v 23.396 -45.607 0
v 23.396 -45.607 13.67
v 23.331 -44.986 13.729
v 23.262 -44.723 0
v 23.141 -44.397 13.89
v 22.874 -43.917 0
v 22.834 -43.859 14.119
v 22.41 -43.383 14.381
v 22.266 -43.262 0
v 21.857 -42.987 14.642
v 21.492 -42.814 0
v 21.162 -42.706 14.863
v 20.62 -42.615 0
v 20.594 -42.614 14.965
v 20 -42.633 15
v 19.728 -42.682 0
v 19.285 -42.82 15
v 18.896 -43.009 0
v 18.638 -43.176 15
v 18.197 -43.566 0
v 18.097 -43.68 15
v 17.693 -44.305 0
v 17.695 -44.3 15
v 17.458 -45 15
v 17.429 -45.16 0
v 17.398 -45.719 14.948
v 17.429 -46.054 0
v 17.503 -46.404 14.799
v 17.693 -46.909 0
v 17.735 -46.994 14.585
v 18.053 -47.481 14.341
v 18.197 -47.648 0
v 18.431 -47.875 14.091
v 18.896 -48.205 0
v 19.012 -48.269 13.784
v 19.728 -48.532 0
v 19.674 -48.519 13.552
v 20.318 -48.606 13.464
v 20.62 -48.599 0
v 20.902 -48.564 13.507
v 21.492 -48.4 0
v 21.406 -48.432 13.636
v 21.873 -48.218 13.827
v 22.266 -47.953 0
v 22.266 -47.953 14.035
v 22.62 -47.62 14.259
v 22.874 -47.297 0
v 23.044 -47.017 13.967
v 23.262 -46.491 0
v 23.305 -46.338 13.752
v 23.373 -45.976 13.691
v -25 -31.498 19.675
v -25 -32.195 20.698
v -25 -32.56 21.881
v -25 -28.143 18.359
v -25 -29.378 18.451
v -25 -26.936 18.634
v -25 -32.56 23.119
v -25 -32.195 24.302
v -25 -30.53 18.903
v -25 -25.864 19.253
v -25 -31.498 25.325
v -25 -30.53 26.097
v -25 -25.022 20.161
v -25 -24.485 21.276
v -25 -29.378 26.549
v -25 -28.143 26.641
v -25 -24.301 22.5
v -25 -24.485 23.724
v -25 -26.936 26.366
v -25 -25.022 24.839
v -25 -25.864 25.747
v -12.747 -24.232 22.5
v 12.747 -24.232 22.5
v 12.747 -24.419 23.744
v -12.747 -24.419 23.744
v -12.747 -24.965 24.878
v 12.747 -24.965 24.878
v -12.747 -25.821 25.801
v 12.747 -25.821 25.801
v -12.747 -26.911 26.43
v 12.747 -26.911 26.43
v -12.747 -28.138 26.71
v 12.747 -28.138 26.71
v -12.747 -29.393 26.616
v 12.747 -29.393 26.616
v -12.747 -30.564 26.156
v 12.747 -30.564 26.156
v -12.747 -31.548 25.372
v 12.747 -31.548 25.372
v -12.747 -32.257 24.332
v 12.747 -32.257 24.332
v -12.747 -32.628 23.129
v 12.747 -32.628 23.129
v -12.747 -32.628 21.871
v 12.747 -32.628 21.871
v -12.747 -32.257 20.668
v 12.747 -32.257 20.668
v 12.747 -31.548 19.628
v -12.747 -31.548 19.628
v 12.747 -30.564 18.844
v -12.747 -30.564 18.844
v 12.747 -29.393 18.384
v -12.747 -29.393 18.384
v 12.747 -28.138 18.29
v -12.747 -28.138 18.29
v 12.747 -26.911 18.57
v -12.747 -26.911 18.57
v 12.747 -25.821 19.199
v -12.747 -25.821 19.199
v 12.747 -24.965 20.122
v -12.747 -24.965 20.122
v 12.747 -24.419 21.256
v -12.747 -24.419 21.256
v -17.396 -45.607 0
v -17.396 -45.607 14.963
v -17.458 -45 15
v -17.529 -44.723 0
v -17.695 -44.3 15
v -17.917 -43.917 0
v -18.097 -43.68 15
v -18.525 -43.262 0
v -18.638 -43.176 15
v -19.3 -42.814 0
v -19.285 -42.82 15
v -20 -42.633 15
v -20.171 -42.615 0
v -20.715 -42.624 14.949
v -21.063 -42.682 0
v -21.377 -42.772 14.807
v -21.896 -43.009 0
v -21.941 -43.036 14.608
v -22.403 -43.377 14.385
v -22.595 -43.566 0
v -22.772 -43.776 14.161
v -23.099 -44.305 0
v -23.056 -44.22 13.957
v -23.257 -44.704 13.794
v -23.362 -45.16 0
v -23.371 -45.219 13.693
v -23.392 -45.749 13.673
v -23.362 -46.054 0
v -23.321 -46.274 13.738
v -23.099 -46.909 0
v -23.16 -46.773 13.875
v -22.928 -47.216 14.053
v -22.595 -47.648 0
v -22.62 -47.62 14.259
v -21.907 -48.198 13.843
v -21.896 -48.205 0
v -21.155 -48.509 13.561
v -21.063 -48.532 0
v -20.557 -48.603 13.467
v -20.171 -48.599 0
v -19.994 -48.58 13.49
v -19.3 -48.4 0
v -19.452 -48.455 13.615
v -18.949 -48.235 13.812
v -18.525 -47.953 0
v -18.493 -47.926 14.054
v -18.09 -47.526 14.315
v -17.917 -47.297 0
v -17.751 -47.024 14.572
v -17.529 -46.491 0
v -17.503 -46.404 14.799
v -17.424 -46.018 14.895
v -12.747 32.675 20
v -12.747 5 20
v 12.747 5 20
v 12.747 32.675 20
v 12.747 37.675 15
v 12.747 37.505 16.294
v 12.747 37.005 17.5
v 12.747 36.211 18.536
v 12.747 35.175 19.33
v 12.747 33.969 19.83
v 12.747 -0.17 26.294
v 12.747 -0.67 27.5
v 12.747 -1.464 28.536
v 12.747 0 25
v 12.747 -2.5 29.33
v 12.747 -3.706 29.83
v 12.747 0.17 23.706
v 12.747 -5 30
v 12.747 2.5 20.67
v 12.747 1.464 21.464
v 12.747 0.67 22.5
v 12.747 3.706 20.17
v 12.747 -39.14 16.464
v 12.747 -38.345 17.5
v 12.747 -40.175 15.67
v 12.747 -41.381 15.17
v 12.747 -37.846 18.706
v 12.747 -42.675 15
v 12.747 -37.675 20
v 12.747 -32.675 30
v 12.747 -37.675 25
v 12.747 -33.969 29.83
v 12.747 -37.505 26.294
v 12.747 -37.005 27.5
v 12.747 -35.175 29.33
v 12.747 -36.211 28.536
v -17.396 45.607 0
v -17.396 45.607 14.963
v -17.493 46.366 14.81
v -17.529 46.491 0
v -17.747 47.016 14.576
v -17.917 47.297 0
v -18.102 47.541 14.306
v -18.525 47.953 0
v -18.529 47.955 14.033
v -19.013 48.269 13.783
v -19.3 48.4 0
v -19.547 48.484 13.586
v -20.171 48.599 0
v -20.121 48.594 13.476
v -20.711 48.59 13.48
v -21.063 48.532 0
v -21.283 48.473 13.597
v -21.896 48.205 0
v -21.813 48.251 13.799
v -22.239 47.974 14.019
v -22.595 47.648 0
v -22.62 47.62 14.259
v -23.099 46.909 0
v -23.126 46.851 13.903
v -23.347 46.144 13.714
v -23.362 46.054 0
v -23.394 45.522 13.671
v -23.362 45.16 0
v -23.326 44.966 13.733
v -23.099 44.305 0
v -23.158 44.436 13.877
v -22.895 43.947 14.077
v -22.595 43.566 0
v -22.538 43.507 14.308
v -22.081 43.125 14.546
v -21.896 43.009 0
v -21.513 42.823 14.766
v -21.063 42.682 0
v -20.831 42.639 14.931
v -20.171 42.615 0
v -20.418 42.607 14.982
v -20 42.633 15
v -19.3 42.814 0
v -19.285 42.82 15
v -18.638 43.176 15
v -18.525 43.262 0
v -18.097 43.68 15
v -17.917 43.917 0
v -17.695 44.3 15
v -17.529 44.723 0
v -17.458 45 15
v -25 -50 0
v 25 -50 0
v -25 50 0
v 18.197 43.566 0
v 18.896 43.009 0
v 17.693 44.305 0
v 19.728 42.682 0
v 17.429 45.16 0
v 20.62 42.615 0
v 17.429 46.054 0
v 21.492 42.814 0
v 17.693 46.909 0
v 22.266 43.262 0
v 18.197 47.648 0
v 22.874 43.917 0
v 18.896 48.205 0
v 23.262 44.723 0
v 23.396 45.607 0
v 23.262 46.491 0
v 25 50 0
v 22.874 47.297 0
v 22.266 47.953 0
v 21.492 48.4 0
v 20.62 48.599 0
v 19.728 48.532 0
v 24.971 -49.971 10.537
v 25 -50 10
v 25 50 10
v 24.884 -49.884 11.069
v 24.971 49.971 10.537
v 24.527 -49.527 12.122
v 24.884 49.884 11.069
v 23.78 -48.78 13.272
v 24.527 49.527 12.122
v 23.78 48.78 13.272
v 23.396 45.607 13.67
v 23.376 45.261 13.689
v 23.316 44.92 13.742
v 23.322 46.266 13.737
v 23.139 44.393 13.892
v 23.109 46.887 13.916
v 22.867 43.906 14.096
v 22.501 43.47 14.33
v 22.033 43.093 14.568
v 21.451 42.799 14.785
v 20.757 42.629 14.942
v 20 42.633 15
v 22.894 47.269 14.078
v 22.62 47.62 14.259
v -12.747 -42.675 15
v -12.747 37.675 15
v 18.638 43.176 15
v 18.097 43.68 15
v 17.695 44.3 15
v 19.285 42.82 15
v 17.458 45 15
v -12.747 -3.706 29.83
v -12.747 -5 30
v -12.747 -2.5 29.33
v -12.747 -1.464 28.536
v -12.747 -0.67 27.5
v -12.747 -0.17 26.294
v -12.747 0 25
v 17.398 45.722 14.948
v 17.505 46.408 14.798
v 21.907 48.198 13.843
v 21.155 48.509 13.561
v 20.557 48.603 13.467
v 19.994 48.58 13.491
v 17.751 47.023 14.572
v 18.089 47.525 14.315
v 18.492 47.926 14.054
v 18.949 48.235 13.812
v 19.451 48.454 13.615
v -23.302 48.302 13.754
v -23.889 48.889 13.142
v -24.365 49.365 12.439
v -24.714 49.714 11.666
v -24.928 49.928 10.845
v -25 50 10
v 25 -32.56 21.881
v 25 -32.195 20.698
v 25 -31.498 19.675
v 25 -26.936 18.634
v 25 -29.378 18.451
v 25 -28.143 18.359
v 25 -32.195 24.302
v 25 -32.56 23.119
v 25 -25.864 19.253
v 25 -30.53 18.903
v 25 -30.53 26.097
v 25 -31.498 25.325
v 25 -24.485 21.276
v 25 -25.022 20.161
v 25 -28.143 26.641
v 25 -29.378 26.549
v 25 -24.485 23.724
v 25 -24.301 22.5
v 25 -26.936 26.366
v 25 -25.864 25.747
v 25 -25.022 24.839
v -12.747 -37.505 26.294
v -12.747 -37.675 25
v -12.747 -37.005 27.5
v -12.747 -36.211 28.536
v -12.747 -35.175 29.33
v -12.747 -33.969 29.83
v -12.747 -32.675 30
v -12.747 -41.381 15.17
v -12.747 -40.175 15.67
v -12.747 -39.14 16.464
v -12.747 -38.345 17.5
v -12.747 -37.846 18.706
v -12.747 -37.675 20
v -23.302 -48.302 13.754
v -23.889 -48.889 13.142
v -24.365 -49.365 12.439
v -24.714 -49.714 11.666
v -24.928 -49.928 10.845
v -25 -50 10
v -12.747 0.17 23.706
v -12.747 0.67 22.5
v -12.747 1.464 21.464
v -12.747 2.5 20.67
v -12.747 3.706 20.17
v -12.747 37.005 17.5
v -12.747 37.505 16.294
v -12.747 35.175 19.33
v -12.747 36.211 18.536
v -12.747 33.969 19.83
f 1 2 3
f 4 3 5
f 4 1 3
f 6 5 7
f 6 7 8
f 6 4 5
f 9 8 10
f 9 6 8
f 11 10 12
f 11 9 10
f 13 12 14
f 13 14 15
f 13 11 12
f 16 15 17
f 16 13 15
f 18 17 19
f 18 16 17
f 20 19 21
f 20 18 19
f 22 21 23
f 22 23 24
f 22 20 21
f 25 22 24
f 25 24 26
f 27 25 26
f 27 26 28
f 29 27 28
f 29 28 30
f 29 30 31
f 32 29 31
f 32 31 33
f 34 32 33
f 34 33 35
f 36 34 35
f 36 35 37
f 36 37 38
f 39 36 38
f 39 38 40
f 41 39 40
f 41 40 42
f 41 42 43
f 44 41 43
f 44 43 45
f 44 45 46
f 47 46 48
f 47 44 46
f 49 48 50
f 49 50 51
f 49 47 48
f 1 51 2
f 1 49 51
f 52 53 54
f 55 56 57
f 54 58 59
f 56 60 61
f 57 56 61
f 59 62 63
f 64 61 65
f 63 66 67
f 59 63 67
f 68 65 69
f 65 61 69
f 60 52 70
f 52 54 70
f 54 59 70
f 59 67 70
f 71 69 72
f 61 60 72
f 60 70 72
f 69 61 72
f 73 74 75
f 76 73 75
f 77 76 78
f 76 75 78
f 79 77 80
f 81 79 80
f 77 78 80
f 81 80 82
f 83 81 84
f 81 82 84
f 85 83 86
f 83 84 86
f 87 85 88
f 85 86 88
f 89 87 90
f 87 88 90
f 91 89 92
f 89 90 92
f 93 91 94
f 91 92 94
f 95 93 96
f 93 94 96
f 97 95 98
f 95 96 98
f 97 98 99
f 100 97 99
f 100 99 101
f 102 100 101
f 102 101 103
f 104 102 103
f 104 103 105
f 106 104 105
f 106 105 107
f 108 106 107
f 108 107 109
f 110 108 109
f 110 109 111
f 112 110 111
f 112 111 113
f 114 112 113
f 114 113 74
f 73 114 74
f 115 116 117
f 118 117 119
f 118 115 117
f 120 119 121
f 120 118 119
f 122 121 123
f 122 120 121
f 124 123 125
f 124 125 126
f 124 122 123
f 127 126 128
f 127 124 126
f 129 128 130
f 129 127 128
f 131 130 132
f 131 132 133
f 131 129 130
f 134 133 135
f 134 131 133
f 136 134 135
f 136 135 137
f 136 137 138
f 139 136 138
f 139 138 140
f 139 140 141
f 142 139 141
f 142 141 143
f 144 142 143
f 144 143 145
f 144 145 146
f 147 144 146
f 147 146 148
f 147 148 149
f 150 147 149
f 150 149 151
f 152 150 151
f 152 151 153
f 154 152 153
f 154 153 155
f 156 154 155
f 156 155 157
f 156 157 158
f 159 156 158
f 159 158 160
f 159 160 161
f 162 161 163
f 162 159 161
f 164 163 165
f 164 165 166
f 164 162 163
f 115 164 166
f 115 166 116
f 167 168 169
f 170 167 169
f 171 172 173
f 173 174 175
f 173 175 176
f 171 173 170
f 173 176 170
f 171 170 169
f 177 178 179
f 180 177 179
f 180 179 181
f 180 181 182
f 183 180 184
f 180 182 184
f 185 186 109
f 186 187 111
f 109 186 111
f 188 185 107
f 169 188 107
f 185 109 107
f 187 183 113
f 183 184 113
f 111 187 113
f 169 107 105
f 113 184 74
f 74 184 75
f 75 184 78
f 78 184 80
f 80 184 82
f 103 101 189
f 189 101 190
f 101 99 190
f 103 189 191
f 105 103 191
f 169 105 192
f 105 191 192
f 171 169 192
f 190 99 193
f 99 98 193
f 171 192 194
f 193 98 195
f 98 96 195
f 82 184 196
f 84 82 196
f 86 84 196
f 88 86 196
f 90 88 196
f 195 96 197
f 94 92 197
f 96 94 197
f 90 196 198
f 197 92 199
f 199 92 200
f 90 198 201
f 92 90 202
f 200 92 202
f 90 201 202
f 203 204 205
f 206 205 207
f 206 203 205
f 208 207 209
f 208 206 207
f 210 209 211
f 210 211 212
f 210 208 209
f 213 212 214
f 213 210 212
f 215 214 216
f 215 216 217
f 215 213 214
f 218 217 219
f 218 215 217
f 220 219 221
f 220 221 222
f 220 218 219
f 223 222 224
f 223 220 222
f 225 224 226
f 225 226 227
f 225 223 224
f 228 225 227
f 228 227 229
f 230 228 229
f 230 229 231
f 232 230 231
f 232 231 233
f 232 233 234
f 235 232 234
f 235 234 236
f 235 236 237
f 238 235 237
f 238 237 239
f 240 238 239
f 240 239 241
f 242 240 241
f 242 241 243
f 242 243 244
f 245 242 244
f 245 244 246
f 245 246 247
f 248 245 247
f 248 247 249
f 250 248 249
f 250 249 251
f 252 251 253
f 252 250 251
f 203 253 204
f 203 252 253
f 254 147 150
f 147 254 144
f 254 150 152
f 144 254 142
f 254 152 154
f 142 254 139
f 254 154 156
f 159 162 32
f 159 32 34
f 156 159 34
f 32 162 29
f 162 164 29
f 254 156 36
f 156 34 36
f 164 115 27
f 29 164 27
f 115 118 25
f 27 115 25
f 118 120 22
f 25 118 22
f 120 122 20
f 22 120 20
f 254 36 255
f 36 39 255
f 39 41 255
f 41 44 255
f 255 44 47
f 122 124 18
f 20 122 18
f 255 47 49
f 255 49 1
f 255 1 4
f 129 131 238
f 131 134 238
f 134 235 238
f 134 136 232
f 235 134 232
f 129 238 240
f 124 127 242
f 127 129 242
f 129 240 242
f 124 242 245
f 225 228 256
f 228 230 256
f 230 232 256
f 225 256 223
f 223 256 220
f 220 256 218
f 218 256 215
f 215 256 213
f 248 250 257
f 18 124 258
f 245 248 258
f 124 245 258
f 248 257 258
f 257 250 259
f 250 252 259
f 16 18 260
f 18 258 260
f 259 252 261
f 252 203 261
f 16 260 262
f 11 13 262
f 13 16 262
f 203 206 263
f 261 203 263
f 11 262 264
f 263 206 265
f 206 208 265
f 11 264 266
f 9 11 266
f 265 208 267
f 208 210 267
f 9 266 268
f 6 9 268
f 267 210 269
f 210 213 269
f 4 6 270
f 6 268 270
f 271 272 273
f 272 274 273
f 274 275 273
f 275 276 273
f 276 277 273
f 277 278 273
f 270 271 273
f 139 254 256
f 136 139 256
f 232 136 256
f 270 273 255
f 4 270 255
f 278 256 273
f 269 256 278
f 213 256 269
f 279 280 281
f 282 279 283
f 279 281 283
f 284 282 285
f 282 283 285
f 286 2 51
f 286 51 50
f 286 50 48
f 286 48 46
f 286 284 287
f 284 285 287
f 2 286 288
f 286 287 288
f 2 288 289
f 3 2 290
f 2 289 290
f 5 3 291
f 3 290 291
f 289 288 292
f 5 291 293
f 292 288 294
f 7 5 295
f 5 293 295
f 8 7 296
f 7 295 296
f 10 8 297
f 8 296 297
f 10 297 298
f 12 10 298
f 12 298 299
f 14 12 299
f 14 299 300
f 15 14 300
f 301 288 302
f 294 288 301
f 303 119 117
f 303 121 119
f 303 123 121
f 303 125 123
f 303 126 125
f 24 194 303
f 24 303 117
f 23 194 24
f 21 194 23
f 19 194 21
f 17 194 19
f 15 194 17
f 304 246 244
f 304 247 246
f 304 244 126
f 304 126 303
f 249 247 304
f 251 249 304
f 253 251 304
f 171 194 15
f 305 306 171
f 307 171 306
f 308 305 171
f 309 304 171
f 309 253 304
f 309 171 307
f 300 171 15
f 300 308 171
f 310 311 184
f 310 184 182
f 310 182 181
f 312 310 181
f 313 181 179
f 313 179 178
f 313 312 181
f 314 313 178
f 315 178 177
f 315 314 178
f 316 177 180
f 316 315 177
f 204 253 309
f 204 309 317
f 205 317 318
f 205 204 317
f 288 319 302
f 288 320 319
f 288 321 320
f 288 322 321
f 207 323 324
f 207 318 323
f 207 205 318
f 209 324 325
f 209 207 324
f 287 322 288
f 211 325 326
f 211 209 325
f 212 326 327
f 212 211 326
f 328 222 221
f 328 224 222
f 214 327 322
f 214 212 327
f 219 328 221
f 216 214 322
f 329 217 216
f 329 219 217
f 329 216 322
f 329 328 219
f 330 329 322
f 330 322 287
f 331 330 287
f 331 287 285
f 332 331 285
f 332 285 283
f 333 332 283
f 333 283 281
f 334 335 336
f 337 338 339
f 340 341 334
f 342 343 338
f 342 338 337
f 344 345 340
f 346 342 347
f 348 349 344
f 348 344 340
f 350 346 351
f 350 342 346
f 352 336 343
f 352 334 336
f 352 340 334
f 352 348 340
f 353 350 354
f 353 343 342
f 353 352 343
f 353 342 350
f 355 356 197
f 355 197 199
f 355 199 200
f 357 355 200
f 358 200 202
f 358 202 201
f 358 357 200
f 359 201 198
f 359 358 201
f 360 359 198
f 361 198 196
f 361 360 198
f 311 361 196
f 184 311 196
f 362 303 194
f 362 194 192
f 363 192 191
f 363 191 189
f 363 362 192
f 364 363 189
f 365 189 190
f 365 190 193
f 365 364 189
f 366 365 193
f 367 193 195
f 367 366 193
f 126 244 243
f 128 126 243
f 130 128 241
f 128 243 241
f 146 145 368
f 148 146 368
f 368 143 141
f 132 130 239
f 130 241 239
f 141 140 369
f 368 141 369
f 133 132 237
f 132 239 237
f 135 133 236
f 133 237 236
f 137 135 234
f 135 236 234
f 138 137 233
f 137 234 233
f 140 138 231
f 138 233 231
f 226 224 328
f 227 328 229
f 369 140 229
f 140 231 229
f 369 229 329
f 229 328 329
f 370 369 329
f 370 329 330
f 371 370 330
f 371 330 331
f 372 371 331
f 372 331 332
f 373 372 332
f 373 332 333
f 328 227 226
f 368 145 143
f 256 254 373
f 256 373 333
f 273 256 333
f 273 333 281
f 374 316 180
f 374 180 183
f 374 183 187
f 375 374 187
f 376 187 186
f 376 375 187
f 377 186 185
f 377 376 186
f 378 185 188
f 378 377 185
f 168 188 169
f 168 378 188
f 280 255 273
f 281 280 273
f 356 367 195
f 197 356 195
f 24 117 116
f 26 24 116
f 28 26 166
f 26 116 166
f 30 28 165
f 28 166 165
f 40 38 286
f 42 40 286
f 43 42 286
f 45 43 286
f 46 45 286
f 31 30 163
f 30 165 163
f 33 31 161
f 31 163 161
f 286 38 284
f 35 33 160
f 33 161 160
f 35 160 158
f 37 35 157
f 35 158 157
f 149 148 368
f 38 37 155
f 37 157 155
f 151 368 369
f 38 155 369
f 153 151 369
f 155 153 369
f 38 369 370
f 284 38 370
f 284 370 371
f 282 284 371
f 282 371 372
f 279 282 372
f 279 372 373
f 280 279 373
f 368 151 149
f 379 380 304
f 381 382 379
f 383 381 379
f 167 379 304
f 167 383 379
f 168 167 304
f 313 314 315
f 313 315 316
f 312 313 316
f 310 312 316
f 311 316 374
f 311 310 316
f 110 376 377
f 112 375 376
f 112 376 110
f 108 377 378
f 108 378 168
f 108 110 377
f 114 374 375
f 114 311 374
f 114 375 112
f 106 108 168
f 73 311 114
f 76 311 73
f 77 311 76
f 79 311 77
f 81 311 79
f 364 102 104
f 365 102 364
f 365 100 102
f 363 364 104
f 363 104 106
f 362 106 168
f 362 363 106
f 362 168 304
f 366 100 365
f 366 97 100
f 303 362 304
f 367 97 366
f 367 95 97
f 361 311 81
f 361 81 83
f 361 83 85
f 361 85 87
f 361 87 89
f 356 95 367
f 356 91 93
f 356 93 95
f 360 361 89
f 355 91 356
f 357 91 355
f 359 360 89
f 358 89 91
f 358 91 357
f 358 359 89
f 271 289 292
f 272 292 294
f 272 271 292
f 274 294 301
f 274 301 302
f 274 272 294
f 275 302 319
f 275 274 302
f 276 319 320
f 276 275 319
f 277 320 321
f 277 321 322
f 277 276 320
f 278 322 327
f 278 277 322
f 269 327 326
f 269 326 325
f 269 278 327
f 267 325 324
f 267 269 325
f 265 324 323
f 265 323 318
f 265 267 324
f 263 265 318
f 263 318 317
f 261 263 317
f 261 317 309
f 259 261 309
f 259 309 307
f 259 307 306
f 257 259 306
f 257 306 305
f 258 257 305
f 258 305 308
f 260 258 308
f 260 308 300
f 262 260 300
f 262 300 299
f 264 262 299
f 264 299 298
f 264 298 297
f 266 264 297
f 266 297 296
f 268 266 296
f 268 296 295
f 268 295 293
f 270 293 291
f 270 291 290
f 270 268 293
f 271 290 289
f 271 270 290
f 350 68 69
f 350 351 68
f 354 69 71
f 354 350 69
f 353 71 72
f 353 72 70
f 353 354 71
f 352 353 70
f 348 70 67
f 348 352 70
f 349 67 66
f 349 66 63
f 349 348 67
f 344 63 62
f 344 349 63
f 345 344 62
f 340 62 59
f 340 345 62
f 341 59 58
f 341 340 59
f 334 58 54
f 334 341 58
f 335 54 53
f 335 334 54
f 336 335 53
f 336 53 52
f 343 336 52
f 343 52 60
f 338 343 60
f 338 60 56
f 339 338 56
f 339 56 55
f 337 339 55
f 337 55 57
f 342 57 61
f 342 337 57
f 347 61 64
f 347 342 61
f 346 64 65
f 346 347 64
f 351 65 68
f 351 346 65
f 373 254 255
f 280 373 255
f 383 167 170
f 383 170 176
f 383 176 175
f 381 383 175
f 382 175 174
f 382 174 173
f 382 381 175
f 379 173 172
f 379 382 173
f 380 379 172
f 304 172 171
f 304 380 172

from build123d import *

# Parameters (mm, degrees)
F0_W        = 50
F0_H        = 100
F0_R        = 3
F1_DEPTH    = 15
F0_W_2      = 25.4946034402
F0_H_2      = 37.6753620803
F2_DEPTH    = 20
F3_DEPTH    = 30
F4_T1_DEPTH = 25.4946034402
F4_T3_DEPTH = 50.4946034402
F4_T5_DEPTH = 125
F4_T7_DEPTH = 75
F5_R        = 4.2218085751
F6_DEPTH    = 31.6
F7_R        = 4.1529704456
F8_DEPTH    = 25


# Not quite as in the source:
# - a fillet or chamfer that OpenCascade refuses, or shapes differently, is made with other operations: its cross-section is extruded or revolved along the edge and cut away or added


with BuildPart() as f1:
    # F0 (on Top) → F1 (new body)
    with BuildSketch(Plane.XY):
        Rectangle(F0_W, F0_H)
        with Locations((-20.3956849873, -45.6070154905)):
            Circle(F0_R, mode=Mode.SUBTRACT)
        with Locations((20.3956849873, -45.6070154905)):
            Circle(F0_R, mode=Mode.SUBTRACT)
        with Locations((-20.3956849873, 45.6070154905)):
            Circle(F0_R, mode=Mode.SUBTRACT)
        Polygon((-12.7473017201, 37.6753620803), (12.7473017201, 37.6753620803), (12.7473017201, 0), (12.7473017201, -37.6753620803), (-12.7473017201, -37.6753620803), (-12.7473017201, 0), align=None, mode=Mode.SUBTRACT)
        with Locations((20.3956849873, 45.6070154905)):
            Circle(F0_R, mode=Mode.SUBTRACT)
    extrude(amount=F1_DEPTH)

    # F0 (on Top) → F2 (join)
    with BuildSketch(Plane.XY):
        with Locations((0, 18.8376810402)):
            Rectangle(F0_W_2, F0_H_2)
    extrude(amount=F2_DEPTH)

    # F0 (on Top) → F3 (join)
    with BuildSketch(Plane.XY):
        with Locations((0, -18.8376810402)):
            Rectangle(F0_W_2, F0_H_2)
    extrude(amount=F3_DEPTH)

    # F4: fillet of radius 5 on 9 edges, made by hand

    # F4_s2 → F4_t1 (join)
    with BuildSketch(Plane.YZ.offset(-12.7473017201)):
        with BuildLine():
            ThreePointArc((0, 25), (1.4644660941, 21.4644660941), (5, 20))
            Line((5, 20), (0, 20))
            Line((0, 20), (0, 25))
        make_face()
        with BuildLine():
            ThreePointArc((-42.6753620803, 15), (-39.1398281744, 16.4644660941), (-37.6753620803, 20))
            Line((-37.6753620803, 20), (-37.6753620803, 15))
            Line((-37.6753620803, 15), (-42.6753620803, 15))
        make_face()
    extrude(amount=F4_T1_DEPTH)

    # F4_s4 → F4_t3 (cut)
    with BuildSketch(Plane.YZ.offset(-25.2473017201)):
        with BuildLine():
            ThreePointArc((-5, 30), (-1.4644660941, 28.5355339059), (0, 25))
            Line((0, 25), (0, 30))
            Line((0, 30), (-5, 30))
        make_face()
        with BuildLine():
            ThreePointArc((32.6753620803, 20), (36.2108959863, 18.5355339059), (37.6753620803, 15))
            Line((37.6753620803, 15), (37.6753620803, 20))
            Line((37.6753620803, 20), (32.6753620803, 20))
        make_face()
        with BuildLine():
            ThreePointArc((-37.6753620803, 25), (-36.2108959863, 28.5355339059), (-32.6753620803, 30))
            Line((-32.6753620803, 30), (-37.6753620803, 30))
            Line((-37.6753620803, 30), (-37.6753620803, 25))
        make_face()
    extrude(amount=F4_T3_DEPTH, mode=Mode.SUBTRACT)

    # F4_s6 → F4_t5 (cut)
    with BuildSketch(Plane.XZ.offset(-62.5)):
        with BuildLine():
            ThreePointArc((-20, 15), (-23.5355339059, 13.5355339059), (-25, 10))
            Line((-25, 10), (-25, 15))
            Line((-25, 15), (-20, 15))
        make_face()
        with BuildLine():
            ThreePointArc((25, 10), (23.5355339059, 13.5355339059), (20, 15))
            Line((20, 15), (25, 15))
            Line((25, 15), (25, 10))
        make_face()
    extrude(amount=F4_T5_DEPTH, mode=Mode.SUBTRACT)

    # F4_s8 → F4_t7 (cut)
    with BuildSketch(Plane.YZ.offset(-37.5)):
        with BuildLine():
            ThreePointArc((-45, 15), (-48.5355339059, 13.5355339059), (-50, 10))
            Line((-50, 10), (-50, 15))
            Line((-50, 15), (-45, 15))
        make_face()
        with BuildLine():
            ThreePointArc((45, 15), (48.5355339059, 13.5355339059), (50, 10))
            Line((50, 10), (50, 15))
            Line((50, 15), (45, 15))
        make_face()
    extrude(amount=F4_T7_DEPTH, mode=Mode.SUBTRACT)

    # F5 (on face) → F6 (cut)
    with BuildSketch(Plane.YZ.offset(12.7473017201)):
        with Locations((-28.4535535052, 22.5)):
            Circle(F5_R)
    extrude(amount=-F6_DEPTH, mode=Mode.SUBTRACT)


with BuildPart() as f8:
    # F7 (on Right) → F8 (new body, symmetric)
    with BuildSketch(Plane.YZ):
        with Locations((-28.4535535052, 22.5)):
            Circle(F7_R)
    extrude(amount=F8_DEPTH, both=True)


solid = Compound([f1.part, f8.part])
